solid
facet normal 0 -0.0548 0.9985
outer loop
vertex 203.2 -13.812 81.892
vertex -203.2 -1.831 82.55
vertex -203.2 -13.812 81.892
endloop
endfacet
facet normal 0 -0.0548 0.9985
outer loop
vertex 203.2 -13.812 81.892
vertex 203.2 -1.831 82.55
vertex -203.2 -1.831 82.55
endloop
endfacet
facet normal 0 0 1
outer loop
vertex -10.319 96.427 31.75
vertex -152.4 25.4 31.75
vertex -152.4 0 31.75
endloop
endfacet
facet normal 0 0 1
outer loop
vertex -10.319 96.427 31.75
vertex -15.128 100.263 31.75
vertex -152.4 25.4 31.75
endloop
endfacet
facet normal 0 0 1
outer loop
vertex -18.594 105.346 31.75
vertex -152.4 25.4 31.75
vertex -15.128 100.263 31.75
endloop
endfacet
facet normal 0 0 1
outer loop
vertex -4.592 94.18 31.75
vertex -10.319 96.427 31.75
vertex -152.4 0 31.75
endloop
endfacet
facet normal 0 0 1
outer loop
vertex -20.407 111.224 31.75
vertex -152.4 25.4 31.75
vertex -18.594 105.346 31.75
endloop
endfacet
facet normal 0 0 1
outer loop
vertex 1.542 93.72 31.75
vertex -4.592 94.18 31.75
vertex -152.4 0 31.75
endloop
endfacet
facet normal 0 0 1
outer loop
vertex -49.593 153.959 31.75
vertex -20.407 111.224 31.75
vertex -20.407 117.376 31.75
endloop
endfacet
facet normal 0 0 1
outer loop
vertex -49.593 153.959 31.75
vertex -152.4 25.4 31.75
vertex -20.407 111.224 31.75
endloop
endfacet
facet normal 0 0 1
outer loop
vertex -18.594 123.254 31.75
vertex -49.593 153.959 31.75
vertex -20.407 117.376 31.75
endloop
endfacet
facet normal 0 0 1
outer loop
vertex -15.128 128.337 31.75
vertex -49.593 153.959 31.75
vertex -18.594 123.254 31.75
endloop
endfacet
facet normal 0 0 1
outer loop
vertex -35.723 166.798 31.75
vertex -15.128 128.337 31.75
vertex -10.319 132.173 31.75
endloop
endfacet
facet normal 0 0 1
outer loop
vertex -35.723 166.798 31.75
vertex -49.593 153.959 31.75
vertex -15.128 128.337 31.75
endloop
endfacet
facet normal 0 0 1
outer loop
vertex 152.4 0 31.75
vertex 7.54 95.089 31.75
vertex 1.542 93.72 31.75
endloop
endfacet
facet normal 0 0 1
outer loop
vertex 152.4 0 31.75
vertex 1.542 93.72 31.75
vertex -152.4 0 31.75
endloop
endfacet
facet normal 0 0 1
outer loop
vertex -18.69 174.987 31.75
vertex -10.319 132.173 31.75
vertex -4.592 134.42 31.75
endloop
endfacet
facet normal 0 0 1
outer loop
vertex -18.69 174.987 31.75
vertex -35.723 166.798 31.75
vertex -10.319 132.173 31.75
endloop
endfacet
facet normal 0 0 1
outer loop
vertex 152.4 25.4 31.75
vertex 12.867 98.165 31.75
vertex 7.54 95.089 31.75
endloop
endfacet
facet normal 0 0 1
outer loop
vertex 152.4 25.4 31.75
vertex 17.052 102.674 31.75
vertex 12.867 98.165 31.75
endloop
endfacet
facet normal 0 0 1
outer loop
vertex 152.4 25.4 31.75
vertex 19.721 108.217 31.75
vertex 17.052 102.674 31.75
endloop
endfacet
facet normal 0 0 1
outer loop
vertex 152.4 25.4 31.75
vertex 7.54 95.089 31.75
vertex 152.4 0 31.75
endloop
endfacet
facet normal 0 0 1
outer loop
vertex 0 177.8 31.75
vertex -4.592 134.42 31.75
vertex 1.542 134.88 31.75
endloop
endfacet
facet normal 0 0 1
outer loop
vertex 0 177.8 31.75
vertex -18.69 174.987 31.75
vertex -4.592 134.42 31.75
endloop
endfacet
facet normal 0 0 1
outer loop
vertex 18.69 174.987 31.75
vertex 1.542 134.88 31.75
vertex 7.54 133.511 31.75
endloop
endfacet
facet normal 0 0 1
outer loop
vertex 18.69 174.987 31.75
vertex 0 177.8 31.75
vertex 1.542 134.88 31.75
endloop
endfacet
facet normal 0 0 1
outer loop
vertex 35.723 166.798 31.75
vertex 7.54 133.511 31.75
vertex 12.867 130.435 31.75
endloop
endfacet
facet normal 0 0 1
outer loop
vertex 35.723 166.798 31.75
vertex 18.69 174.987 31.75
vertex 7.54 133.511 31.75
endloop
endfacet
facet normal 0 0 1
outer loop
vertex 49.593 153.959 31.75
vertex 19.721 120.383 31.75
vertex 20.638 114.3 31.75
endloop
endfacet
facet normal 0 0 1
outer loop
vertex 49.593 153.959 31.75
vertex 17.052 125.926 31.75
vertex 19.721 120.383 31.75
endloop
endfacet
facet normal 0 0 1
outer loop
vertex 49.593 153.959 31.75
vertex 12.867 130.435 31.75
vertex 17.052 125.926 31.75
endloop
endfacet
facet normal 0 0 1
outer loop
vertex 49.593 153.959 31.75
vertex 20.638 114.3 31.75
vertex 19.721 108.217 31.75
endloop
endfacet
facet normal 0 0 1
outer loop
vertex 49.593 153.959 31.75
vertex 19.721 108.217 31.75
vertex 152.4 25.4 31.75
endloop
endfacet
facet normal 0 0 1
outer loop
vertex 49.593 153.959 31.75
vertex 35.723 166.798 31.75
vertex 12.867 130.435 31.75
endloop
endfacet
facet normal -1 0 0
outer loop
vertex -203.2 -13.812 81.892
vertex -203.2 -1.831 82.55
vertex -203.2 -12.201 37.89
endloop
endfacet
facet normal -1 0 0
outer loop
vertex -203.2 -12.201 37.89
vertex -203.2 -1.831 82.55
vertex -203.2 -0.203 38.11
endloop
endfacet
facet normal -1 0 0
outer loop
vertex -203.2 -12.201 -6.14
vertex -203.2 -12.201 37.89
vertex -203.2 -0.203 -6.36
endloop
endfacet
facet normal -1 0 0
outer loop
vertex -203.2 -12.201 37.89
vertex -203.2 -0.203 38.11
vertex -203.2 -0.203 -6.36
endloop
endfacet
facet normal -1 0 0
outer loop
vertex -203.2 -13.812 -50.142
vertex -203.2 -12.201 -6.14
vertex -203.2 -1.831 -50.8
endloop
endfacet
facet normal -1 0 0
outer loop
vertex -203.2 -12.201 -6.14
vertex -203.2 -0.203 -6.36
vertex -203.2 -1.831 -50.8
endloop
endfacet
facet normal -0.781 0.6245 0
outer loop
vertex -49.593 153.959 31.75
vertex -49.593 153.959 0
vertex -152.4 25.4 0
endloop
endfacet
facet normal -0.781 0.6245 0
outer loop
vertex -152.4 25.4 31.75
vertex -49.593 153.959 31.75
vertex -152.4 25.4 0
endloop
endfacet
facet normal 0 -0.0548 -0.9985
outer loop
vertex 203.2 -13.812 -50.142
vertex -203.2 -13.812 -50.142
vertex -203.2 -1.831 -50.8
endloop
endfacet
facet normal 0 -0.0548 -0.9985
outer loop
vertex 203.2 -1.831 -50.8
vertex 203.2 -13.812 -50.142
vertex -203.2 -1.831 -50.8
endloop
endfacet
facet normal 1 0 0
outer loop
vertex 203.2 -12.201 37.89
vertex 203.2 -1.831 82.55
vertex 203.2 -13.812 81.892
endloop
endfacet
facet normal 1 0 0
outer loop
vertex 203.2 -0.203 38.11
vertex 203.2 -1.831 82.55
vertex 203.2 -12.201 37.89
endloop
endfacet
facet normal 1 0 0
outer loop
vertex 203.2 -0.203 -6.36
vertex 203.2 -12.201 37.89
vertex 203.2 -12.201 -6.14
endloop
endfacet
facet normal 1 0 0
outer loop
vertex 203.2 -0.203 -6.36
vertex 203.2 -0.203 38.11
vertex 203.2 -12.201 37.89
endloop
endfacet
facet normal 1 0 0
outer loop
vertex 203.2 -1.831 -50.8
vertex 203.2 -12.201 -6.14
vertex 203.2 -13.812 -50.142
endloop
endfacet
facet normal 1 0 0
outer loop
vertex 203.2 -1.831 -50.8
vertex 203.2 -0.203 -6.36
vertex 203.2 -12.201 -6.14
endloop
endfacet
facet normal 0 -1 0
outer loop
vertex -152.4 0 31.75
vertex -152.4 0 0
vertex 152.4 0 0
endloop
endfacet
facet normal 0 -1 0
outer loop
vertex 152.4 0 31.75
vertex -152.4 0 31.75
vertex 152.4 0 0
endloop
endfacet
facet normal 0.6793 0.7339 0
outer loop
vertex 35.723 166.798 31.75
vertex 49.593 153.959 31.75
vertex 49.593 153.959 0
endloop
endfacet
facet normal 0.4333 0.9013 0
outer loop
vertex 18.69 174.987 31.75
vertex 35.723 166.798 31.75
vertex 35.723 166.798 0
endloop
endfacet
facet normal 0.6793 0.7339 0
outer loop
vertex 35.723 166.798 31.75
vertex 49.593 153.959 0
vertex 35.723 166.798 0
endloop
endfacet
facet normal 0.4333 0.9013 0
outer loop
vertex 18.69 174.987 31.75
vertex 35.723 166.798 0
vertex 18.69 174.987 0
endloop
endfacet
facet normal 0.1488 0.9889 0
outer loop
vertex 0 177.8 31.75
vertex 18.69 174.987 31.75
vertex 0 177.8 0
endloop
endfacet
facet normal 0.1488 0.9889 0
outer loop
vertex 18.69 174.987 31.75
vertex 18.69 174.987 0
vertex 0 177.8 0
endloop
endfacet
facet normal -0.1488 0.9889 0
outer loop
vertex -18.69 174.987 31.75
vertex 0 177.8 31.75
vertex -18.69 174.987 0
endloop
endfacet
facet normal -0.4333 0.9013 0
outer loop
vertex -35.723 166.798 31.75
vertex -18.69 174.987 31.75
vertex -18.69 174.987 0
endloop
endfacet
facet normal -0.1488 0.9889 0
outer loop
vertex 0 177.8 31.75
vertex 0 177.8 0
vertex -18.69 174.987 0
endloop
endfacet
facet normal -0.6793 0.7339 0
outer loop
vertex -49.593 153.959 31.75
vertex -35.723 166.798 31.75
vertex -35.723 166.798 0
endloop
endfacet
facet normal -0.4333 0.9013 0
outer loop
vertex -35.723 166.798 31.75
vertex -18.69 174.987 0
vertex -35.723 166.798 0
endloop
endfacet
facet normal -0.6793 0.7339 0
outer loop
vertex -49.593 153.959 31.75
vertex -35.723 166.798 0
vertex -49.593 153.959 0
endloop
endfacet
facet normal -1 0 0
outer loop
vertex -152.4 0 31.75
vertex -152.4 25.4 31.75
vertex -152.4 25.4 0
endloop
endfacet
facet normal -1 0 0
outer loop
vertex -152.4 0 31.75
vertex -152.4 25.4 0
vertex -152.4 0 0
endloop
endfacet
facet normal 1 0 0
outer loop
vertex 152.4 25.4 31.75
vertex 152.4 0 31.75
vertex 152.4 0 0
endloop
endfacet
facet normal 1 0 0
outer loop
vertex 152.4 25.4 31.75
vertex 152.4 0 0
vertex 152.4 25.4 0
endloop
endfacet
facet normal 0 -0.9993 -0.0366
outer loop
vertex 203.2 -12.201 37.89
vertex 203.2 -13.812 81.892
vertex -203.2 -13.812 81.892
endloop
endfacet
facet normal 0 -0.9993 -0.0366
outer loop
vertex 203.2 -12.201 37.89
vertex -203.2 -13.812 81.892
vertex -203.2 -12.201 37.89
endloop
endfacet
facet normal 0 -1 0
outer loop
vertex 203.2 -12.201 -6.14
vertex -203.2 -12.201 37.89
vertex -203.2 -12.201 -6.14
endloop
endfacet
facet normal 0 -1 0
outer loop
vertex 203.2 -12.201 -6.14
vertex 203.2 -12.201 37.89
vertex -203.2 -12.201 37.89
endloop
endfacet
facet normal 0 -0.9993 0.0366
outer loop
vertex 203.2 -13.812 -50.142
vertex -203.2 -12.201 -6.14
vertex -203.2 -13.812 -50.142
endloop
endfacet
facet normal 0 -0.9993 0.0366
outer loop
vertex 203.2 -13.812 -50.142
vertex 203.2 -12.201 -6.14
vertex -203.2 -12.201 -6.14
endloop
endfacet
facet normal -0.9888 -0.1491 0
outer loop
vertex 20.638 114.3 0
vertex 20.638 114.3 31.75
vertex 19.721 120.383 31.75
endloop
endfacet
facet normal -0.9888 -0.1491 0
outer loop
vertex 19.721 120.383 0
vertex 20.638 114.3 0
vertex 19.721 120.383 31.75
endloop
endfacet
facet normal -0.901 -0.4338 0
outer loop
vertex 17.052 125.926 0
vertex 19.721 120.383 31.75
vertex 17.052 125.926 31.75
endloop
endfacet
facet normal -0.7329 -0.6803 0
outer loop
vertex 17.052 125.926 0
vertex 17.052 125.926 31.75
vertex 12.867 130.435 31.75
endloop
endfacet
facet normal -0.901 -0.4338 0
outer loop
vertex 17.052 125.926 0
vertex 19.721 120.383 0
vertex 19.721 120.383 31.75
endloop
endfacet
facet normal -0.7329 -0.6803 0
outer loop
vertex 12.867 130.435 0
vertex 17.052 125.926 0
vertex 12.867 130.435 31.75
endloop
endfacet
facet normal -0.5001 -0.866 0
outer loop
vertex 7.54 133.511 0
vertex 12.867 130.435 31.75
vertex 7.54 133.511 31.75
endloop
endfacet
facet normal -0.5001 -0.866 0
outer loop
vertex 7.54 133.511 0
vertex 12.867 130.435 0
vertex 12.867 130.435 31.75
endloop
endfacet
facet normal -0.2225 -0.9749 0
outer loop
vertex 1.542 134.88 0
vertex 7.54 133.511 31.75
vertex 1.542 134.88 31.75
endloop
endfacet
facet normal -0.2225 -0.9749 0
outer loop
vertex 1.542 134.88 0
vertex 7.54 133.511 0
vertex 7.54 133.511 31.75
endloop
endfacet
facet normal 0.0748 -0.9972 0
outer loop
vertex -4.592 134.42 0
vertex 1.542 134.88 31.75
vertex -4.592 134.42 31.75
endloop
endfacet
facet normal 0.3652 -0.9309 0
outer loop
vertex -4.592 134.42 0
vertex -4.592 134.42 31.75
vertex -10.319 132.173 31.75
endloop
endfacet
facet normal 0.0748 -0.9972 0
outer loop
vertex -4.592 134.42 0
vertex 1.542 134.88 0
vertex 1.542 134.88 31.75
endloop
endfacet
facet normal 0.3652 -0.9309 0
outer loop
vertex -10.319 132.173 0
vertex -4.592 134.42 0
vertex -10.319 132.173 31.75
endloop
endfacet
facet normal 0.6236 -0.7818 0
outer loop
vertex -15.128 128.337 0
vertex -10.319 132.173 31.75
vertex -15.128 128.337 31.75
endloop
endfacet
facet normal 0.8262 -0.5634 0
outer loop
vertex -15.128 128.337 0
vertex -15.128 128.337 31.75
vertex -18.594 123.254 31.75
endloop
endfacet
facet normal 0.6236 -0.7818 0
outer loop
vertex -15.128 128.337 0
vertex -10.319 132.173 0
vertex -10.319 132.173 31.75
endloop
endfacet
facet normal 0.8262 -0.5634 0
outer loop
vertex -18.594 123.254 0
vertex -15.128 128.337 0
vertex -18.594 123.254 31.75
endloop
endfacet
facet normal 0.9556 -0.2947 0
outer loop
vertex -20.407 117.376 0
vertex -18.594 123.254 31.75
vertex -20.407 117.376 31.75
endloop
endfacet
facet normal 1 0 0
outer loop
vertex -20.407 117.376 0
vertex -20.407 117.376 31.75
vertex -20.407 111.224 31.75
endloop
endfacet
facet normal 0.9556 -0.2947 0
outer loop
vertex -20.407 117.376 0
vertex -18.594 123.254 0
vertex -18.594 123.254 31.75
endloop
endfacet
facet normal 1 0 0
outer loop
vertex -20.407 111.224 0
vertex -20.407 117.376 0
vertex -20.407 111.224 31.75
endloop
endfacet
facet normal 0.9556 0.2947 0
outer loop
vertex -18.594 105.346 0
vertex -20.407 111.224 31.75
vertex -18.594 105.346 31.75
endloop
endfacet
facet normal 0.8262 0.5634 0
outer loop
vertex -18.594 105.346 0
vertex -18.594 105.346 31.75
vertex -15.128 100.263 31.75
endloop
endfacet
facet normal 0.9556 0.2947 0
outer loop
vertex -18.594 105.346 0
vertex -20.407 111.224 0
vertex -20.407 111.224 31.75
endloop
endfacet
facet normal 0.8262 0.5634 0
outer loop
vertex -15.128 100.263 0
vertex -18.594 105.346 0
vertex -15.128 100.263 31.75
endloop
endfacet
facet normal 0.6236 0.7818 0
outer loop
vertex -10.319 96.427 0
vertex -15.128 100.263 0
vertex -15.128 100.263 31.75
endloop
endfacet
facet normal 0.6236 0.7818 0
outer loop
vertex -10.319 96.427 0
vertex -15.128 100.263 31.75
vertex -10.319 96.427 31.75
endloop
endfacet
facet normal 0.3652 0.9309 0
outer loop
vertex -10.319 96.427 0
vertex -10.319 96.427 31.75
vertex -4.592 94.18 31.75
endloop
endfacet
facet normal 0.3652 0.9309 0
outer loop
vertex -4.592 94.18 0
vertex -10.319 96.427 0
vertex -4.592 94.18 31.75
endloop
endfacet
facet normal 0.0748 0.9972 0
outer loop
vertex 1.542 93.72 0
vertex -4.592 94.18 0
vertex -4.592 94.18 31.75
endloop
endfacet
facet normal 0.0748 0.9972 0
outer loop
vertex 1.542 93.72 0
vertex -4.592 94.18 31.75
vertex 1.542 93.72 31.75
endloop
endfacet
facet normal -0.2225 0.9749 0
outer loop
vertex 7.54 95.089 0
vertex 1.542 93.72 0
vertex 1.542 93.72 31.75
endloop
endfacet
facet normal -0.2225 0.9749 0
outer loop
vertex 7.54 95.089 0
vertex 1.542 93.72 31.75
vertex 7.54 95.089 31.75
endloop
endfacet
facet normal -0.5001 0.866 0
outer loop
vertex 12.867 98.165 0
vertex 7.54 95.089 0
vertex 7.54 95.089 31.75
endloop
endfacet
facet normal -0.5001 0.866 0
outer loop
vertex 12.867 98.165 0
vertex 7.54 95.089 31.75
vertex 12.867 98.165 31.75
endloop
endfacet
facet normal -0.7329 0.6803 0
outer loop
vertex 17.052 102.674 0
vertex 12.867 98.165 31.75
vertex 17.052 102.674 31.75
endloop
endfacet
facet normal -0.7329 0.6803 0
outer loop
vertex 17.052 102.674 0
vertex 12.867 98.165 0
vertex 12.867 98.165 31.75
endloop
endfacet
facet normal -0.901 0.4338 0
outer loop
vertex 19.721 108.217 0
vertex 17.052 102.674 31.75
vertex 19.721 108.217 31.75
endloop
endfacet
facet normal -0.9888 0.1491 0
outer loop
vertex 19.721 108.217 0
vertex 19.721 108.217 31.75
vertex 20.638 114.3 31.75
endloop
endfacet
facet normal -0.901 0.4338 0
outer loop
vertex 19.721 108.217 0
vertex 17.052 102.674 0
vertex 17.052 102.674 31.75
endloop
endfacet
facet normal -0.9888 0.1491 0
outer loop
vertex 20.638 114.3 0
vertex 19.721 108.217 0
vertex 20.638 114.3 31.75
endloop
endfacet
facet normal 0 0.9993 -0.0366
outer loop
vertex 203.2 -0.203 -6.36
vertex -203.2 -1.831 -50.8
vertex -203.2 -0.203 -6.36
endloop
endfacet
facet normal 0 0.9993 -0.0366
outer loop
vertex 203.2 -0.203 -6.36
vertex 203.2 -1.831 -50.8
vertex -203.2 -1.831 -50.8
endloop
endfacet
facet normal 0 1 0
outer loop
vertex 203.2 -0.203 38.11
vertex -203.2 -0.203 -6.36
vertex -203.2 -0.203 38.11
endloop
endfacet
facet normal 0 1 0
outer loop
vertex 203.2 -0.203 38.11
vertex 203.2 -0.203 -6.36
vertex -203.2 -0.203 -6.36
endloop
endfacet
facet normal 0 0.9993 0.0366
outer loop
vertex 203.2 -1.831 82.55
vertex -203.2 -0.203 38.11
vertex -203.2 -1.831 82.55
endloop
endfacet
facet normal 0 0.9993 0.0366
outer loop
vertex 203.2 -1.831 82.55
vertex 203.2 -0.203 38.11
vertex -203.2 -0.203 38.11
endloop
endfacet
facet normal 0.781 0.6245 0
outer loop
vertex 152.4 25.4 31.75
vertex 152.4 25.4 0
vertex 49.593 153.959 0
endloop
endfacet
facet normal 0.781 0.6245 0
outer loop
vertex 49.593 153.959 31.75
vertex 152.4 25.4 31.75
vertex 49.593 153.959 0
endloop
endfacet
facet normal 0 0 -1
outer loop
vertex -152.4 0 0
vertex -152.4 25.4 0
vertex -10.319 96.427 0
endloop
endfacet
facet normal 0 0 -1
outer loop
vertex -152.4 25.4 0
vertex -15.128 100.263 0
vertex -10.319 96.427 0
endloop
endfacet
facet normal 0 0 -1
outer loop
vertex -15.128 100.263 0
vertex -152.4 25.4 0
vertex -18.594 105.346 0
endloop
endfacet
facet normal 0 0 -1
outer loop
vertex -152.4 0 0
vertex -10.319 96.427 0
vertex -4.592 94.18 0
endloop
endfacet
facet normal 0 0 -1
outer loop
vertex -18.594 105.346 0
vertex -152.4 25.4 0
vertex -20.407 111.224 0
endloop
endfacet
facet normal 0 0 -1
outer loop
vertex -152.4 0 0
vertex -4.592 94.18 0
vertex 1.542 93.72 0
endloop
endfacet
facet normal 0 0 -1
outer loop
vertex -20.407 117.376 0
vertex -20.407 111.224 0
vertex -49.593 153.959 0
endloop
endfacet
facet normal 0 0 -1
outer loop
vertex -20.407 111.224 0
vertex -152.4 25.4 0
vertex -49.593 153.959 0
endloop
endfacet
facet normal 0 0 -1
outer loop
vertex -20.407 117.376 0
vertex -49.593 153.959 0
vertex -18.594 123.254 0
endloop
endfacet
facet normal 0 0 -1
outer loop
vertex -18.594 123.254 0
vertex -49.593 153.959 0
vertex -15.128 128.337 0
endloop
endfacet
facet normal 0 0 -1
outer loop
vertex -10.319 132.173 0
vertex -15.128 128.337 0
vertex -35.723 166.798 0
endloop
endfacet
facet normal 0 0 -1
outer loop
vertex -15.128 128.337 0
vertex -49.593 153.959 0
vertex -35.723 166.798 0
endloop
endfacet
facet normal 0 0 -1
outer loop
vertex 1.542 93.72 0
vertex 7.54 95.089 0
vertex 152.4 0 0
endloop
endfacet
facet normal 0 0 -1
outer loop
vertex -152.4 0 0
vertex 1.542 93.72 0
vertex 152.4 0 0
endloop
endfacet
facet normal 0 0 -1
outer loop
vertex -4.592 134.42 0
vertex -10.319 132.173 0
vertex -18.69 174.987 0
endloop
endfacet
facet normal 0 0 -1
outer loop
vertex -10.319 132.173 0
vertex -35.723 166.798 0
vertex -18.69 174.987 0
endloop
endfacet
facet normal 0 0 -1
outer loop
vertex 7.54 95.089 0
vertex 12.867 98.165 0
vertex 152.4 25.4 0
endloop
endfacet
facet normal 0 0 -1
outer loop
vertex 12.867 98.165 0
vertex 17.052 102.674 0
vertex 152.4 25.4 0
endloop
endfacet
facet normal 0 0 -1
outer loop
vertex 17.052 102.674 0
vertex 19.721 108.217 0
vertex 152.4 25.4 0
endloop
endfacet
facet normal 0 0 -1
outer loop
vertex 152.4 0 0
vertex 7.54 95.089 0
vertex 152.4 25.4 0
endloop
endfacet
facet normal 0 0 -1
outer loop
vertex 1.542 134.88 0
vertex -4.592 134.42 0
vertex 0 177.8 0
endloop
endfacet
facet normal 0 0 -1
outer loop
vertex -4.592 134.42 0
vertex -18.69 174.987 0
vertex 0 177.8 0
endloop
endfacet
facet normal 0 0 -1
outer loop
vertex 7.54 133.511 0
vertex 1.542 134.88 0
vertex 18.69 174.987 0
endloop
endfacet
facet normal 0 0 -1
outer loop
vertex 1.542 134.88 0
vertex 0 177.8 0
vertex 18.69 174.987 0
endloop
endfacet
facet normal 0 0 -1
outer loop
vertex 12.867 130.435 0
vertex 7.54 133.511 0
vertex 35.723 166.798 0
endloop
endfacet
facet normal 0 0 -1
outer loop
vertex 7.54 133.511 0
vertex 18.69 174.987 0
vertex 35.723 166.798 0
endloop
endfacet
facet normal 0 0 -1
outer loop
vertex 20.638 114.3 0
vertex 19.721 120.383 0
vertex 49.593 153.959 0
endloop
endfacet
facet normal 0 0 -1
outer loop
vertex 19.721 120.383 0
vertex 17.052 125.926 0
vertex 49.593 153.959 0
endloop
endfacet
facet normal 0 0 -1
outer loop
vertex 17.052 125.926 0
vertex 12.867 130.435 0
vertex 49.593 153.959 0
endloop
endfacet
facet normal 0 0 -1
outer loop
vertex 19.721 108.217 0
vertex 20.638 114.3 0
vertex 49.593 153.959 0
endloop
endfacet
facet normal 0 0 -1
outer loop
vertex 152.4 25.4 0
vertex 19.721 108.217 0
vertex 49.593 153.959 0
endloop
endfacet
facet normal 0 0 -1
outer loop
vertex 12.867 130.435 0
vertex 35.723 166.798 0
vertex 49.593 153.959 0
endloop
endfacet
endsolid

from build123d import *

# Parameters (mm, degrees)
SKETCH1_R           = 20.6375
BOSS_EXTRUDE4_DEPTH = 31.75
BOSS_EXTRUDE6_DEPTH = 203.2


with BuildPart() as part:
    # Sketch1 → Boss-Extrude4 (new body)
    with BuildSketch(Plane.XY):
        with BuildLine():
            Line((-152.4, 0), (152.4, 0))
            Line((152.4, 0), (152.4, 25.4))
            Line((152.4, 25.4), (49.592634616, 153.958802199))
            ThreePointArc((49.592634616, 153.958802199), (0, 177.8), (-49.592634616, 153.958802199))
            Line((-49.592634616, 153.958802199), (-152.4, 25.4))
            Line((-152.4, 25.4), (-152.4, 0))
        make_face()
        with Locations((0, 114.3)):
            Circle(SKETCH1_R, mode=Mode.SUBTRACT)
    extrude(amount=BOSS_EXTRUDE4_DEPTH)


with BuildPart() as body_2:
    # Sketch5 → Boss-Extrude6 (new, symmetric)
    with BuildSketch(Plane(origin=(0, 0, 0), x_dir=(0, 0, -1), z_dir=(1, 0, 0))):
        with BuildLine():
            Line((-82.55, -1.830524376), (-81.891589862, -13.812448099))
            ThreePointArc((-81.891589862, -13.812448099), (-15.875, -12), (50.141589862, -13.812448099))
            Line((50.141589862, -13.812448099), (50.8, -1.830524376))
            ThreePointArc((50.8, -1.830524376), (-15.875, 0), (-82.55, -1.830524376))
        make_face()
    extrude(amount=BOSS_EXTRUDE6_DEPTH, both=True)


solid = Compound([part.part, body_2.part])
